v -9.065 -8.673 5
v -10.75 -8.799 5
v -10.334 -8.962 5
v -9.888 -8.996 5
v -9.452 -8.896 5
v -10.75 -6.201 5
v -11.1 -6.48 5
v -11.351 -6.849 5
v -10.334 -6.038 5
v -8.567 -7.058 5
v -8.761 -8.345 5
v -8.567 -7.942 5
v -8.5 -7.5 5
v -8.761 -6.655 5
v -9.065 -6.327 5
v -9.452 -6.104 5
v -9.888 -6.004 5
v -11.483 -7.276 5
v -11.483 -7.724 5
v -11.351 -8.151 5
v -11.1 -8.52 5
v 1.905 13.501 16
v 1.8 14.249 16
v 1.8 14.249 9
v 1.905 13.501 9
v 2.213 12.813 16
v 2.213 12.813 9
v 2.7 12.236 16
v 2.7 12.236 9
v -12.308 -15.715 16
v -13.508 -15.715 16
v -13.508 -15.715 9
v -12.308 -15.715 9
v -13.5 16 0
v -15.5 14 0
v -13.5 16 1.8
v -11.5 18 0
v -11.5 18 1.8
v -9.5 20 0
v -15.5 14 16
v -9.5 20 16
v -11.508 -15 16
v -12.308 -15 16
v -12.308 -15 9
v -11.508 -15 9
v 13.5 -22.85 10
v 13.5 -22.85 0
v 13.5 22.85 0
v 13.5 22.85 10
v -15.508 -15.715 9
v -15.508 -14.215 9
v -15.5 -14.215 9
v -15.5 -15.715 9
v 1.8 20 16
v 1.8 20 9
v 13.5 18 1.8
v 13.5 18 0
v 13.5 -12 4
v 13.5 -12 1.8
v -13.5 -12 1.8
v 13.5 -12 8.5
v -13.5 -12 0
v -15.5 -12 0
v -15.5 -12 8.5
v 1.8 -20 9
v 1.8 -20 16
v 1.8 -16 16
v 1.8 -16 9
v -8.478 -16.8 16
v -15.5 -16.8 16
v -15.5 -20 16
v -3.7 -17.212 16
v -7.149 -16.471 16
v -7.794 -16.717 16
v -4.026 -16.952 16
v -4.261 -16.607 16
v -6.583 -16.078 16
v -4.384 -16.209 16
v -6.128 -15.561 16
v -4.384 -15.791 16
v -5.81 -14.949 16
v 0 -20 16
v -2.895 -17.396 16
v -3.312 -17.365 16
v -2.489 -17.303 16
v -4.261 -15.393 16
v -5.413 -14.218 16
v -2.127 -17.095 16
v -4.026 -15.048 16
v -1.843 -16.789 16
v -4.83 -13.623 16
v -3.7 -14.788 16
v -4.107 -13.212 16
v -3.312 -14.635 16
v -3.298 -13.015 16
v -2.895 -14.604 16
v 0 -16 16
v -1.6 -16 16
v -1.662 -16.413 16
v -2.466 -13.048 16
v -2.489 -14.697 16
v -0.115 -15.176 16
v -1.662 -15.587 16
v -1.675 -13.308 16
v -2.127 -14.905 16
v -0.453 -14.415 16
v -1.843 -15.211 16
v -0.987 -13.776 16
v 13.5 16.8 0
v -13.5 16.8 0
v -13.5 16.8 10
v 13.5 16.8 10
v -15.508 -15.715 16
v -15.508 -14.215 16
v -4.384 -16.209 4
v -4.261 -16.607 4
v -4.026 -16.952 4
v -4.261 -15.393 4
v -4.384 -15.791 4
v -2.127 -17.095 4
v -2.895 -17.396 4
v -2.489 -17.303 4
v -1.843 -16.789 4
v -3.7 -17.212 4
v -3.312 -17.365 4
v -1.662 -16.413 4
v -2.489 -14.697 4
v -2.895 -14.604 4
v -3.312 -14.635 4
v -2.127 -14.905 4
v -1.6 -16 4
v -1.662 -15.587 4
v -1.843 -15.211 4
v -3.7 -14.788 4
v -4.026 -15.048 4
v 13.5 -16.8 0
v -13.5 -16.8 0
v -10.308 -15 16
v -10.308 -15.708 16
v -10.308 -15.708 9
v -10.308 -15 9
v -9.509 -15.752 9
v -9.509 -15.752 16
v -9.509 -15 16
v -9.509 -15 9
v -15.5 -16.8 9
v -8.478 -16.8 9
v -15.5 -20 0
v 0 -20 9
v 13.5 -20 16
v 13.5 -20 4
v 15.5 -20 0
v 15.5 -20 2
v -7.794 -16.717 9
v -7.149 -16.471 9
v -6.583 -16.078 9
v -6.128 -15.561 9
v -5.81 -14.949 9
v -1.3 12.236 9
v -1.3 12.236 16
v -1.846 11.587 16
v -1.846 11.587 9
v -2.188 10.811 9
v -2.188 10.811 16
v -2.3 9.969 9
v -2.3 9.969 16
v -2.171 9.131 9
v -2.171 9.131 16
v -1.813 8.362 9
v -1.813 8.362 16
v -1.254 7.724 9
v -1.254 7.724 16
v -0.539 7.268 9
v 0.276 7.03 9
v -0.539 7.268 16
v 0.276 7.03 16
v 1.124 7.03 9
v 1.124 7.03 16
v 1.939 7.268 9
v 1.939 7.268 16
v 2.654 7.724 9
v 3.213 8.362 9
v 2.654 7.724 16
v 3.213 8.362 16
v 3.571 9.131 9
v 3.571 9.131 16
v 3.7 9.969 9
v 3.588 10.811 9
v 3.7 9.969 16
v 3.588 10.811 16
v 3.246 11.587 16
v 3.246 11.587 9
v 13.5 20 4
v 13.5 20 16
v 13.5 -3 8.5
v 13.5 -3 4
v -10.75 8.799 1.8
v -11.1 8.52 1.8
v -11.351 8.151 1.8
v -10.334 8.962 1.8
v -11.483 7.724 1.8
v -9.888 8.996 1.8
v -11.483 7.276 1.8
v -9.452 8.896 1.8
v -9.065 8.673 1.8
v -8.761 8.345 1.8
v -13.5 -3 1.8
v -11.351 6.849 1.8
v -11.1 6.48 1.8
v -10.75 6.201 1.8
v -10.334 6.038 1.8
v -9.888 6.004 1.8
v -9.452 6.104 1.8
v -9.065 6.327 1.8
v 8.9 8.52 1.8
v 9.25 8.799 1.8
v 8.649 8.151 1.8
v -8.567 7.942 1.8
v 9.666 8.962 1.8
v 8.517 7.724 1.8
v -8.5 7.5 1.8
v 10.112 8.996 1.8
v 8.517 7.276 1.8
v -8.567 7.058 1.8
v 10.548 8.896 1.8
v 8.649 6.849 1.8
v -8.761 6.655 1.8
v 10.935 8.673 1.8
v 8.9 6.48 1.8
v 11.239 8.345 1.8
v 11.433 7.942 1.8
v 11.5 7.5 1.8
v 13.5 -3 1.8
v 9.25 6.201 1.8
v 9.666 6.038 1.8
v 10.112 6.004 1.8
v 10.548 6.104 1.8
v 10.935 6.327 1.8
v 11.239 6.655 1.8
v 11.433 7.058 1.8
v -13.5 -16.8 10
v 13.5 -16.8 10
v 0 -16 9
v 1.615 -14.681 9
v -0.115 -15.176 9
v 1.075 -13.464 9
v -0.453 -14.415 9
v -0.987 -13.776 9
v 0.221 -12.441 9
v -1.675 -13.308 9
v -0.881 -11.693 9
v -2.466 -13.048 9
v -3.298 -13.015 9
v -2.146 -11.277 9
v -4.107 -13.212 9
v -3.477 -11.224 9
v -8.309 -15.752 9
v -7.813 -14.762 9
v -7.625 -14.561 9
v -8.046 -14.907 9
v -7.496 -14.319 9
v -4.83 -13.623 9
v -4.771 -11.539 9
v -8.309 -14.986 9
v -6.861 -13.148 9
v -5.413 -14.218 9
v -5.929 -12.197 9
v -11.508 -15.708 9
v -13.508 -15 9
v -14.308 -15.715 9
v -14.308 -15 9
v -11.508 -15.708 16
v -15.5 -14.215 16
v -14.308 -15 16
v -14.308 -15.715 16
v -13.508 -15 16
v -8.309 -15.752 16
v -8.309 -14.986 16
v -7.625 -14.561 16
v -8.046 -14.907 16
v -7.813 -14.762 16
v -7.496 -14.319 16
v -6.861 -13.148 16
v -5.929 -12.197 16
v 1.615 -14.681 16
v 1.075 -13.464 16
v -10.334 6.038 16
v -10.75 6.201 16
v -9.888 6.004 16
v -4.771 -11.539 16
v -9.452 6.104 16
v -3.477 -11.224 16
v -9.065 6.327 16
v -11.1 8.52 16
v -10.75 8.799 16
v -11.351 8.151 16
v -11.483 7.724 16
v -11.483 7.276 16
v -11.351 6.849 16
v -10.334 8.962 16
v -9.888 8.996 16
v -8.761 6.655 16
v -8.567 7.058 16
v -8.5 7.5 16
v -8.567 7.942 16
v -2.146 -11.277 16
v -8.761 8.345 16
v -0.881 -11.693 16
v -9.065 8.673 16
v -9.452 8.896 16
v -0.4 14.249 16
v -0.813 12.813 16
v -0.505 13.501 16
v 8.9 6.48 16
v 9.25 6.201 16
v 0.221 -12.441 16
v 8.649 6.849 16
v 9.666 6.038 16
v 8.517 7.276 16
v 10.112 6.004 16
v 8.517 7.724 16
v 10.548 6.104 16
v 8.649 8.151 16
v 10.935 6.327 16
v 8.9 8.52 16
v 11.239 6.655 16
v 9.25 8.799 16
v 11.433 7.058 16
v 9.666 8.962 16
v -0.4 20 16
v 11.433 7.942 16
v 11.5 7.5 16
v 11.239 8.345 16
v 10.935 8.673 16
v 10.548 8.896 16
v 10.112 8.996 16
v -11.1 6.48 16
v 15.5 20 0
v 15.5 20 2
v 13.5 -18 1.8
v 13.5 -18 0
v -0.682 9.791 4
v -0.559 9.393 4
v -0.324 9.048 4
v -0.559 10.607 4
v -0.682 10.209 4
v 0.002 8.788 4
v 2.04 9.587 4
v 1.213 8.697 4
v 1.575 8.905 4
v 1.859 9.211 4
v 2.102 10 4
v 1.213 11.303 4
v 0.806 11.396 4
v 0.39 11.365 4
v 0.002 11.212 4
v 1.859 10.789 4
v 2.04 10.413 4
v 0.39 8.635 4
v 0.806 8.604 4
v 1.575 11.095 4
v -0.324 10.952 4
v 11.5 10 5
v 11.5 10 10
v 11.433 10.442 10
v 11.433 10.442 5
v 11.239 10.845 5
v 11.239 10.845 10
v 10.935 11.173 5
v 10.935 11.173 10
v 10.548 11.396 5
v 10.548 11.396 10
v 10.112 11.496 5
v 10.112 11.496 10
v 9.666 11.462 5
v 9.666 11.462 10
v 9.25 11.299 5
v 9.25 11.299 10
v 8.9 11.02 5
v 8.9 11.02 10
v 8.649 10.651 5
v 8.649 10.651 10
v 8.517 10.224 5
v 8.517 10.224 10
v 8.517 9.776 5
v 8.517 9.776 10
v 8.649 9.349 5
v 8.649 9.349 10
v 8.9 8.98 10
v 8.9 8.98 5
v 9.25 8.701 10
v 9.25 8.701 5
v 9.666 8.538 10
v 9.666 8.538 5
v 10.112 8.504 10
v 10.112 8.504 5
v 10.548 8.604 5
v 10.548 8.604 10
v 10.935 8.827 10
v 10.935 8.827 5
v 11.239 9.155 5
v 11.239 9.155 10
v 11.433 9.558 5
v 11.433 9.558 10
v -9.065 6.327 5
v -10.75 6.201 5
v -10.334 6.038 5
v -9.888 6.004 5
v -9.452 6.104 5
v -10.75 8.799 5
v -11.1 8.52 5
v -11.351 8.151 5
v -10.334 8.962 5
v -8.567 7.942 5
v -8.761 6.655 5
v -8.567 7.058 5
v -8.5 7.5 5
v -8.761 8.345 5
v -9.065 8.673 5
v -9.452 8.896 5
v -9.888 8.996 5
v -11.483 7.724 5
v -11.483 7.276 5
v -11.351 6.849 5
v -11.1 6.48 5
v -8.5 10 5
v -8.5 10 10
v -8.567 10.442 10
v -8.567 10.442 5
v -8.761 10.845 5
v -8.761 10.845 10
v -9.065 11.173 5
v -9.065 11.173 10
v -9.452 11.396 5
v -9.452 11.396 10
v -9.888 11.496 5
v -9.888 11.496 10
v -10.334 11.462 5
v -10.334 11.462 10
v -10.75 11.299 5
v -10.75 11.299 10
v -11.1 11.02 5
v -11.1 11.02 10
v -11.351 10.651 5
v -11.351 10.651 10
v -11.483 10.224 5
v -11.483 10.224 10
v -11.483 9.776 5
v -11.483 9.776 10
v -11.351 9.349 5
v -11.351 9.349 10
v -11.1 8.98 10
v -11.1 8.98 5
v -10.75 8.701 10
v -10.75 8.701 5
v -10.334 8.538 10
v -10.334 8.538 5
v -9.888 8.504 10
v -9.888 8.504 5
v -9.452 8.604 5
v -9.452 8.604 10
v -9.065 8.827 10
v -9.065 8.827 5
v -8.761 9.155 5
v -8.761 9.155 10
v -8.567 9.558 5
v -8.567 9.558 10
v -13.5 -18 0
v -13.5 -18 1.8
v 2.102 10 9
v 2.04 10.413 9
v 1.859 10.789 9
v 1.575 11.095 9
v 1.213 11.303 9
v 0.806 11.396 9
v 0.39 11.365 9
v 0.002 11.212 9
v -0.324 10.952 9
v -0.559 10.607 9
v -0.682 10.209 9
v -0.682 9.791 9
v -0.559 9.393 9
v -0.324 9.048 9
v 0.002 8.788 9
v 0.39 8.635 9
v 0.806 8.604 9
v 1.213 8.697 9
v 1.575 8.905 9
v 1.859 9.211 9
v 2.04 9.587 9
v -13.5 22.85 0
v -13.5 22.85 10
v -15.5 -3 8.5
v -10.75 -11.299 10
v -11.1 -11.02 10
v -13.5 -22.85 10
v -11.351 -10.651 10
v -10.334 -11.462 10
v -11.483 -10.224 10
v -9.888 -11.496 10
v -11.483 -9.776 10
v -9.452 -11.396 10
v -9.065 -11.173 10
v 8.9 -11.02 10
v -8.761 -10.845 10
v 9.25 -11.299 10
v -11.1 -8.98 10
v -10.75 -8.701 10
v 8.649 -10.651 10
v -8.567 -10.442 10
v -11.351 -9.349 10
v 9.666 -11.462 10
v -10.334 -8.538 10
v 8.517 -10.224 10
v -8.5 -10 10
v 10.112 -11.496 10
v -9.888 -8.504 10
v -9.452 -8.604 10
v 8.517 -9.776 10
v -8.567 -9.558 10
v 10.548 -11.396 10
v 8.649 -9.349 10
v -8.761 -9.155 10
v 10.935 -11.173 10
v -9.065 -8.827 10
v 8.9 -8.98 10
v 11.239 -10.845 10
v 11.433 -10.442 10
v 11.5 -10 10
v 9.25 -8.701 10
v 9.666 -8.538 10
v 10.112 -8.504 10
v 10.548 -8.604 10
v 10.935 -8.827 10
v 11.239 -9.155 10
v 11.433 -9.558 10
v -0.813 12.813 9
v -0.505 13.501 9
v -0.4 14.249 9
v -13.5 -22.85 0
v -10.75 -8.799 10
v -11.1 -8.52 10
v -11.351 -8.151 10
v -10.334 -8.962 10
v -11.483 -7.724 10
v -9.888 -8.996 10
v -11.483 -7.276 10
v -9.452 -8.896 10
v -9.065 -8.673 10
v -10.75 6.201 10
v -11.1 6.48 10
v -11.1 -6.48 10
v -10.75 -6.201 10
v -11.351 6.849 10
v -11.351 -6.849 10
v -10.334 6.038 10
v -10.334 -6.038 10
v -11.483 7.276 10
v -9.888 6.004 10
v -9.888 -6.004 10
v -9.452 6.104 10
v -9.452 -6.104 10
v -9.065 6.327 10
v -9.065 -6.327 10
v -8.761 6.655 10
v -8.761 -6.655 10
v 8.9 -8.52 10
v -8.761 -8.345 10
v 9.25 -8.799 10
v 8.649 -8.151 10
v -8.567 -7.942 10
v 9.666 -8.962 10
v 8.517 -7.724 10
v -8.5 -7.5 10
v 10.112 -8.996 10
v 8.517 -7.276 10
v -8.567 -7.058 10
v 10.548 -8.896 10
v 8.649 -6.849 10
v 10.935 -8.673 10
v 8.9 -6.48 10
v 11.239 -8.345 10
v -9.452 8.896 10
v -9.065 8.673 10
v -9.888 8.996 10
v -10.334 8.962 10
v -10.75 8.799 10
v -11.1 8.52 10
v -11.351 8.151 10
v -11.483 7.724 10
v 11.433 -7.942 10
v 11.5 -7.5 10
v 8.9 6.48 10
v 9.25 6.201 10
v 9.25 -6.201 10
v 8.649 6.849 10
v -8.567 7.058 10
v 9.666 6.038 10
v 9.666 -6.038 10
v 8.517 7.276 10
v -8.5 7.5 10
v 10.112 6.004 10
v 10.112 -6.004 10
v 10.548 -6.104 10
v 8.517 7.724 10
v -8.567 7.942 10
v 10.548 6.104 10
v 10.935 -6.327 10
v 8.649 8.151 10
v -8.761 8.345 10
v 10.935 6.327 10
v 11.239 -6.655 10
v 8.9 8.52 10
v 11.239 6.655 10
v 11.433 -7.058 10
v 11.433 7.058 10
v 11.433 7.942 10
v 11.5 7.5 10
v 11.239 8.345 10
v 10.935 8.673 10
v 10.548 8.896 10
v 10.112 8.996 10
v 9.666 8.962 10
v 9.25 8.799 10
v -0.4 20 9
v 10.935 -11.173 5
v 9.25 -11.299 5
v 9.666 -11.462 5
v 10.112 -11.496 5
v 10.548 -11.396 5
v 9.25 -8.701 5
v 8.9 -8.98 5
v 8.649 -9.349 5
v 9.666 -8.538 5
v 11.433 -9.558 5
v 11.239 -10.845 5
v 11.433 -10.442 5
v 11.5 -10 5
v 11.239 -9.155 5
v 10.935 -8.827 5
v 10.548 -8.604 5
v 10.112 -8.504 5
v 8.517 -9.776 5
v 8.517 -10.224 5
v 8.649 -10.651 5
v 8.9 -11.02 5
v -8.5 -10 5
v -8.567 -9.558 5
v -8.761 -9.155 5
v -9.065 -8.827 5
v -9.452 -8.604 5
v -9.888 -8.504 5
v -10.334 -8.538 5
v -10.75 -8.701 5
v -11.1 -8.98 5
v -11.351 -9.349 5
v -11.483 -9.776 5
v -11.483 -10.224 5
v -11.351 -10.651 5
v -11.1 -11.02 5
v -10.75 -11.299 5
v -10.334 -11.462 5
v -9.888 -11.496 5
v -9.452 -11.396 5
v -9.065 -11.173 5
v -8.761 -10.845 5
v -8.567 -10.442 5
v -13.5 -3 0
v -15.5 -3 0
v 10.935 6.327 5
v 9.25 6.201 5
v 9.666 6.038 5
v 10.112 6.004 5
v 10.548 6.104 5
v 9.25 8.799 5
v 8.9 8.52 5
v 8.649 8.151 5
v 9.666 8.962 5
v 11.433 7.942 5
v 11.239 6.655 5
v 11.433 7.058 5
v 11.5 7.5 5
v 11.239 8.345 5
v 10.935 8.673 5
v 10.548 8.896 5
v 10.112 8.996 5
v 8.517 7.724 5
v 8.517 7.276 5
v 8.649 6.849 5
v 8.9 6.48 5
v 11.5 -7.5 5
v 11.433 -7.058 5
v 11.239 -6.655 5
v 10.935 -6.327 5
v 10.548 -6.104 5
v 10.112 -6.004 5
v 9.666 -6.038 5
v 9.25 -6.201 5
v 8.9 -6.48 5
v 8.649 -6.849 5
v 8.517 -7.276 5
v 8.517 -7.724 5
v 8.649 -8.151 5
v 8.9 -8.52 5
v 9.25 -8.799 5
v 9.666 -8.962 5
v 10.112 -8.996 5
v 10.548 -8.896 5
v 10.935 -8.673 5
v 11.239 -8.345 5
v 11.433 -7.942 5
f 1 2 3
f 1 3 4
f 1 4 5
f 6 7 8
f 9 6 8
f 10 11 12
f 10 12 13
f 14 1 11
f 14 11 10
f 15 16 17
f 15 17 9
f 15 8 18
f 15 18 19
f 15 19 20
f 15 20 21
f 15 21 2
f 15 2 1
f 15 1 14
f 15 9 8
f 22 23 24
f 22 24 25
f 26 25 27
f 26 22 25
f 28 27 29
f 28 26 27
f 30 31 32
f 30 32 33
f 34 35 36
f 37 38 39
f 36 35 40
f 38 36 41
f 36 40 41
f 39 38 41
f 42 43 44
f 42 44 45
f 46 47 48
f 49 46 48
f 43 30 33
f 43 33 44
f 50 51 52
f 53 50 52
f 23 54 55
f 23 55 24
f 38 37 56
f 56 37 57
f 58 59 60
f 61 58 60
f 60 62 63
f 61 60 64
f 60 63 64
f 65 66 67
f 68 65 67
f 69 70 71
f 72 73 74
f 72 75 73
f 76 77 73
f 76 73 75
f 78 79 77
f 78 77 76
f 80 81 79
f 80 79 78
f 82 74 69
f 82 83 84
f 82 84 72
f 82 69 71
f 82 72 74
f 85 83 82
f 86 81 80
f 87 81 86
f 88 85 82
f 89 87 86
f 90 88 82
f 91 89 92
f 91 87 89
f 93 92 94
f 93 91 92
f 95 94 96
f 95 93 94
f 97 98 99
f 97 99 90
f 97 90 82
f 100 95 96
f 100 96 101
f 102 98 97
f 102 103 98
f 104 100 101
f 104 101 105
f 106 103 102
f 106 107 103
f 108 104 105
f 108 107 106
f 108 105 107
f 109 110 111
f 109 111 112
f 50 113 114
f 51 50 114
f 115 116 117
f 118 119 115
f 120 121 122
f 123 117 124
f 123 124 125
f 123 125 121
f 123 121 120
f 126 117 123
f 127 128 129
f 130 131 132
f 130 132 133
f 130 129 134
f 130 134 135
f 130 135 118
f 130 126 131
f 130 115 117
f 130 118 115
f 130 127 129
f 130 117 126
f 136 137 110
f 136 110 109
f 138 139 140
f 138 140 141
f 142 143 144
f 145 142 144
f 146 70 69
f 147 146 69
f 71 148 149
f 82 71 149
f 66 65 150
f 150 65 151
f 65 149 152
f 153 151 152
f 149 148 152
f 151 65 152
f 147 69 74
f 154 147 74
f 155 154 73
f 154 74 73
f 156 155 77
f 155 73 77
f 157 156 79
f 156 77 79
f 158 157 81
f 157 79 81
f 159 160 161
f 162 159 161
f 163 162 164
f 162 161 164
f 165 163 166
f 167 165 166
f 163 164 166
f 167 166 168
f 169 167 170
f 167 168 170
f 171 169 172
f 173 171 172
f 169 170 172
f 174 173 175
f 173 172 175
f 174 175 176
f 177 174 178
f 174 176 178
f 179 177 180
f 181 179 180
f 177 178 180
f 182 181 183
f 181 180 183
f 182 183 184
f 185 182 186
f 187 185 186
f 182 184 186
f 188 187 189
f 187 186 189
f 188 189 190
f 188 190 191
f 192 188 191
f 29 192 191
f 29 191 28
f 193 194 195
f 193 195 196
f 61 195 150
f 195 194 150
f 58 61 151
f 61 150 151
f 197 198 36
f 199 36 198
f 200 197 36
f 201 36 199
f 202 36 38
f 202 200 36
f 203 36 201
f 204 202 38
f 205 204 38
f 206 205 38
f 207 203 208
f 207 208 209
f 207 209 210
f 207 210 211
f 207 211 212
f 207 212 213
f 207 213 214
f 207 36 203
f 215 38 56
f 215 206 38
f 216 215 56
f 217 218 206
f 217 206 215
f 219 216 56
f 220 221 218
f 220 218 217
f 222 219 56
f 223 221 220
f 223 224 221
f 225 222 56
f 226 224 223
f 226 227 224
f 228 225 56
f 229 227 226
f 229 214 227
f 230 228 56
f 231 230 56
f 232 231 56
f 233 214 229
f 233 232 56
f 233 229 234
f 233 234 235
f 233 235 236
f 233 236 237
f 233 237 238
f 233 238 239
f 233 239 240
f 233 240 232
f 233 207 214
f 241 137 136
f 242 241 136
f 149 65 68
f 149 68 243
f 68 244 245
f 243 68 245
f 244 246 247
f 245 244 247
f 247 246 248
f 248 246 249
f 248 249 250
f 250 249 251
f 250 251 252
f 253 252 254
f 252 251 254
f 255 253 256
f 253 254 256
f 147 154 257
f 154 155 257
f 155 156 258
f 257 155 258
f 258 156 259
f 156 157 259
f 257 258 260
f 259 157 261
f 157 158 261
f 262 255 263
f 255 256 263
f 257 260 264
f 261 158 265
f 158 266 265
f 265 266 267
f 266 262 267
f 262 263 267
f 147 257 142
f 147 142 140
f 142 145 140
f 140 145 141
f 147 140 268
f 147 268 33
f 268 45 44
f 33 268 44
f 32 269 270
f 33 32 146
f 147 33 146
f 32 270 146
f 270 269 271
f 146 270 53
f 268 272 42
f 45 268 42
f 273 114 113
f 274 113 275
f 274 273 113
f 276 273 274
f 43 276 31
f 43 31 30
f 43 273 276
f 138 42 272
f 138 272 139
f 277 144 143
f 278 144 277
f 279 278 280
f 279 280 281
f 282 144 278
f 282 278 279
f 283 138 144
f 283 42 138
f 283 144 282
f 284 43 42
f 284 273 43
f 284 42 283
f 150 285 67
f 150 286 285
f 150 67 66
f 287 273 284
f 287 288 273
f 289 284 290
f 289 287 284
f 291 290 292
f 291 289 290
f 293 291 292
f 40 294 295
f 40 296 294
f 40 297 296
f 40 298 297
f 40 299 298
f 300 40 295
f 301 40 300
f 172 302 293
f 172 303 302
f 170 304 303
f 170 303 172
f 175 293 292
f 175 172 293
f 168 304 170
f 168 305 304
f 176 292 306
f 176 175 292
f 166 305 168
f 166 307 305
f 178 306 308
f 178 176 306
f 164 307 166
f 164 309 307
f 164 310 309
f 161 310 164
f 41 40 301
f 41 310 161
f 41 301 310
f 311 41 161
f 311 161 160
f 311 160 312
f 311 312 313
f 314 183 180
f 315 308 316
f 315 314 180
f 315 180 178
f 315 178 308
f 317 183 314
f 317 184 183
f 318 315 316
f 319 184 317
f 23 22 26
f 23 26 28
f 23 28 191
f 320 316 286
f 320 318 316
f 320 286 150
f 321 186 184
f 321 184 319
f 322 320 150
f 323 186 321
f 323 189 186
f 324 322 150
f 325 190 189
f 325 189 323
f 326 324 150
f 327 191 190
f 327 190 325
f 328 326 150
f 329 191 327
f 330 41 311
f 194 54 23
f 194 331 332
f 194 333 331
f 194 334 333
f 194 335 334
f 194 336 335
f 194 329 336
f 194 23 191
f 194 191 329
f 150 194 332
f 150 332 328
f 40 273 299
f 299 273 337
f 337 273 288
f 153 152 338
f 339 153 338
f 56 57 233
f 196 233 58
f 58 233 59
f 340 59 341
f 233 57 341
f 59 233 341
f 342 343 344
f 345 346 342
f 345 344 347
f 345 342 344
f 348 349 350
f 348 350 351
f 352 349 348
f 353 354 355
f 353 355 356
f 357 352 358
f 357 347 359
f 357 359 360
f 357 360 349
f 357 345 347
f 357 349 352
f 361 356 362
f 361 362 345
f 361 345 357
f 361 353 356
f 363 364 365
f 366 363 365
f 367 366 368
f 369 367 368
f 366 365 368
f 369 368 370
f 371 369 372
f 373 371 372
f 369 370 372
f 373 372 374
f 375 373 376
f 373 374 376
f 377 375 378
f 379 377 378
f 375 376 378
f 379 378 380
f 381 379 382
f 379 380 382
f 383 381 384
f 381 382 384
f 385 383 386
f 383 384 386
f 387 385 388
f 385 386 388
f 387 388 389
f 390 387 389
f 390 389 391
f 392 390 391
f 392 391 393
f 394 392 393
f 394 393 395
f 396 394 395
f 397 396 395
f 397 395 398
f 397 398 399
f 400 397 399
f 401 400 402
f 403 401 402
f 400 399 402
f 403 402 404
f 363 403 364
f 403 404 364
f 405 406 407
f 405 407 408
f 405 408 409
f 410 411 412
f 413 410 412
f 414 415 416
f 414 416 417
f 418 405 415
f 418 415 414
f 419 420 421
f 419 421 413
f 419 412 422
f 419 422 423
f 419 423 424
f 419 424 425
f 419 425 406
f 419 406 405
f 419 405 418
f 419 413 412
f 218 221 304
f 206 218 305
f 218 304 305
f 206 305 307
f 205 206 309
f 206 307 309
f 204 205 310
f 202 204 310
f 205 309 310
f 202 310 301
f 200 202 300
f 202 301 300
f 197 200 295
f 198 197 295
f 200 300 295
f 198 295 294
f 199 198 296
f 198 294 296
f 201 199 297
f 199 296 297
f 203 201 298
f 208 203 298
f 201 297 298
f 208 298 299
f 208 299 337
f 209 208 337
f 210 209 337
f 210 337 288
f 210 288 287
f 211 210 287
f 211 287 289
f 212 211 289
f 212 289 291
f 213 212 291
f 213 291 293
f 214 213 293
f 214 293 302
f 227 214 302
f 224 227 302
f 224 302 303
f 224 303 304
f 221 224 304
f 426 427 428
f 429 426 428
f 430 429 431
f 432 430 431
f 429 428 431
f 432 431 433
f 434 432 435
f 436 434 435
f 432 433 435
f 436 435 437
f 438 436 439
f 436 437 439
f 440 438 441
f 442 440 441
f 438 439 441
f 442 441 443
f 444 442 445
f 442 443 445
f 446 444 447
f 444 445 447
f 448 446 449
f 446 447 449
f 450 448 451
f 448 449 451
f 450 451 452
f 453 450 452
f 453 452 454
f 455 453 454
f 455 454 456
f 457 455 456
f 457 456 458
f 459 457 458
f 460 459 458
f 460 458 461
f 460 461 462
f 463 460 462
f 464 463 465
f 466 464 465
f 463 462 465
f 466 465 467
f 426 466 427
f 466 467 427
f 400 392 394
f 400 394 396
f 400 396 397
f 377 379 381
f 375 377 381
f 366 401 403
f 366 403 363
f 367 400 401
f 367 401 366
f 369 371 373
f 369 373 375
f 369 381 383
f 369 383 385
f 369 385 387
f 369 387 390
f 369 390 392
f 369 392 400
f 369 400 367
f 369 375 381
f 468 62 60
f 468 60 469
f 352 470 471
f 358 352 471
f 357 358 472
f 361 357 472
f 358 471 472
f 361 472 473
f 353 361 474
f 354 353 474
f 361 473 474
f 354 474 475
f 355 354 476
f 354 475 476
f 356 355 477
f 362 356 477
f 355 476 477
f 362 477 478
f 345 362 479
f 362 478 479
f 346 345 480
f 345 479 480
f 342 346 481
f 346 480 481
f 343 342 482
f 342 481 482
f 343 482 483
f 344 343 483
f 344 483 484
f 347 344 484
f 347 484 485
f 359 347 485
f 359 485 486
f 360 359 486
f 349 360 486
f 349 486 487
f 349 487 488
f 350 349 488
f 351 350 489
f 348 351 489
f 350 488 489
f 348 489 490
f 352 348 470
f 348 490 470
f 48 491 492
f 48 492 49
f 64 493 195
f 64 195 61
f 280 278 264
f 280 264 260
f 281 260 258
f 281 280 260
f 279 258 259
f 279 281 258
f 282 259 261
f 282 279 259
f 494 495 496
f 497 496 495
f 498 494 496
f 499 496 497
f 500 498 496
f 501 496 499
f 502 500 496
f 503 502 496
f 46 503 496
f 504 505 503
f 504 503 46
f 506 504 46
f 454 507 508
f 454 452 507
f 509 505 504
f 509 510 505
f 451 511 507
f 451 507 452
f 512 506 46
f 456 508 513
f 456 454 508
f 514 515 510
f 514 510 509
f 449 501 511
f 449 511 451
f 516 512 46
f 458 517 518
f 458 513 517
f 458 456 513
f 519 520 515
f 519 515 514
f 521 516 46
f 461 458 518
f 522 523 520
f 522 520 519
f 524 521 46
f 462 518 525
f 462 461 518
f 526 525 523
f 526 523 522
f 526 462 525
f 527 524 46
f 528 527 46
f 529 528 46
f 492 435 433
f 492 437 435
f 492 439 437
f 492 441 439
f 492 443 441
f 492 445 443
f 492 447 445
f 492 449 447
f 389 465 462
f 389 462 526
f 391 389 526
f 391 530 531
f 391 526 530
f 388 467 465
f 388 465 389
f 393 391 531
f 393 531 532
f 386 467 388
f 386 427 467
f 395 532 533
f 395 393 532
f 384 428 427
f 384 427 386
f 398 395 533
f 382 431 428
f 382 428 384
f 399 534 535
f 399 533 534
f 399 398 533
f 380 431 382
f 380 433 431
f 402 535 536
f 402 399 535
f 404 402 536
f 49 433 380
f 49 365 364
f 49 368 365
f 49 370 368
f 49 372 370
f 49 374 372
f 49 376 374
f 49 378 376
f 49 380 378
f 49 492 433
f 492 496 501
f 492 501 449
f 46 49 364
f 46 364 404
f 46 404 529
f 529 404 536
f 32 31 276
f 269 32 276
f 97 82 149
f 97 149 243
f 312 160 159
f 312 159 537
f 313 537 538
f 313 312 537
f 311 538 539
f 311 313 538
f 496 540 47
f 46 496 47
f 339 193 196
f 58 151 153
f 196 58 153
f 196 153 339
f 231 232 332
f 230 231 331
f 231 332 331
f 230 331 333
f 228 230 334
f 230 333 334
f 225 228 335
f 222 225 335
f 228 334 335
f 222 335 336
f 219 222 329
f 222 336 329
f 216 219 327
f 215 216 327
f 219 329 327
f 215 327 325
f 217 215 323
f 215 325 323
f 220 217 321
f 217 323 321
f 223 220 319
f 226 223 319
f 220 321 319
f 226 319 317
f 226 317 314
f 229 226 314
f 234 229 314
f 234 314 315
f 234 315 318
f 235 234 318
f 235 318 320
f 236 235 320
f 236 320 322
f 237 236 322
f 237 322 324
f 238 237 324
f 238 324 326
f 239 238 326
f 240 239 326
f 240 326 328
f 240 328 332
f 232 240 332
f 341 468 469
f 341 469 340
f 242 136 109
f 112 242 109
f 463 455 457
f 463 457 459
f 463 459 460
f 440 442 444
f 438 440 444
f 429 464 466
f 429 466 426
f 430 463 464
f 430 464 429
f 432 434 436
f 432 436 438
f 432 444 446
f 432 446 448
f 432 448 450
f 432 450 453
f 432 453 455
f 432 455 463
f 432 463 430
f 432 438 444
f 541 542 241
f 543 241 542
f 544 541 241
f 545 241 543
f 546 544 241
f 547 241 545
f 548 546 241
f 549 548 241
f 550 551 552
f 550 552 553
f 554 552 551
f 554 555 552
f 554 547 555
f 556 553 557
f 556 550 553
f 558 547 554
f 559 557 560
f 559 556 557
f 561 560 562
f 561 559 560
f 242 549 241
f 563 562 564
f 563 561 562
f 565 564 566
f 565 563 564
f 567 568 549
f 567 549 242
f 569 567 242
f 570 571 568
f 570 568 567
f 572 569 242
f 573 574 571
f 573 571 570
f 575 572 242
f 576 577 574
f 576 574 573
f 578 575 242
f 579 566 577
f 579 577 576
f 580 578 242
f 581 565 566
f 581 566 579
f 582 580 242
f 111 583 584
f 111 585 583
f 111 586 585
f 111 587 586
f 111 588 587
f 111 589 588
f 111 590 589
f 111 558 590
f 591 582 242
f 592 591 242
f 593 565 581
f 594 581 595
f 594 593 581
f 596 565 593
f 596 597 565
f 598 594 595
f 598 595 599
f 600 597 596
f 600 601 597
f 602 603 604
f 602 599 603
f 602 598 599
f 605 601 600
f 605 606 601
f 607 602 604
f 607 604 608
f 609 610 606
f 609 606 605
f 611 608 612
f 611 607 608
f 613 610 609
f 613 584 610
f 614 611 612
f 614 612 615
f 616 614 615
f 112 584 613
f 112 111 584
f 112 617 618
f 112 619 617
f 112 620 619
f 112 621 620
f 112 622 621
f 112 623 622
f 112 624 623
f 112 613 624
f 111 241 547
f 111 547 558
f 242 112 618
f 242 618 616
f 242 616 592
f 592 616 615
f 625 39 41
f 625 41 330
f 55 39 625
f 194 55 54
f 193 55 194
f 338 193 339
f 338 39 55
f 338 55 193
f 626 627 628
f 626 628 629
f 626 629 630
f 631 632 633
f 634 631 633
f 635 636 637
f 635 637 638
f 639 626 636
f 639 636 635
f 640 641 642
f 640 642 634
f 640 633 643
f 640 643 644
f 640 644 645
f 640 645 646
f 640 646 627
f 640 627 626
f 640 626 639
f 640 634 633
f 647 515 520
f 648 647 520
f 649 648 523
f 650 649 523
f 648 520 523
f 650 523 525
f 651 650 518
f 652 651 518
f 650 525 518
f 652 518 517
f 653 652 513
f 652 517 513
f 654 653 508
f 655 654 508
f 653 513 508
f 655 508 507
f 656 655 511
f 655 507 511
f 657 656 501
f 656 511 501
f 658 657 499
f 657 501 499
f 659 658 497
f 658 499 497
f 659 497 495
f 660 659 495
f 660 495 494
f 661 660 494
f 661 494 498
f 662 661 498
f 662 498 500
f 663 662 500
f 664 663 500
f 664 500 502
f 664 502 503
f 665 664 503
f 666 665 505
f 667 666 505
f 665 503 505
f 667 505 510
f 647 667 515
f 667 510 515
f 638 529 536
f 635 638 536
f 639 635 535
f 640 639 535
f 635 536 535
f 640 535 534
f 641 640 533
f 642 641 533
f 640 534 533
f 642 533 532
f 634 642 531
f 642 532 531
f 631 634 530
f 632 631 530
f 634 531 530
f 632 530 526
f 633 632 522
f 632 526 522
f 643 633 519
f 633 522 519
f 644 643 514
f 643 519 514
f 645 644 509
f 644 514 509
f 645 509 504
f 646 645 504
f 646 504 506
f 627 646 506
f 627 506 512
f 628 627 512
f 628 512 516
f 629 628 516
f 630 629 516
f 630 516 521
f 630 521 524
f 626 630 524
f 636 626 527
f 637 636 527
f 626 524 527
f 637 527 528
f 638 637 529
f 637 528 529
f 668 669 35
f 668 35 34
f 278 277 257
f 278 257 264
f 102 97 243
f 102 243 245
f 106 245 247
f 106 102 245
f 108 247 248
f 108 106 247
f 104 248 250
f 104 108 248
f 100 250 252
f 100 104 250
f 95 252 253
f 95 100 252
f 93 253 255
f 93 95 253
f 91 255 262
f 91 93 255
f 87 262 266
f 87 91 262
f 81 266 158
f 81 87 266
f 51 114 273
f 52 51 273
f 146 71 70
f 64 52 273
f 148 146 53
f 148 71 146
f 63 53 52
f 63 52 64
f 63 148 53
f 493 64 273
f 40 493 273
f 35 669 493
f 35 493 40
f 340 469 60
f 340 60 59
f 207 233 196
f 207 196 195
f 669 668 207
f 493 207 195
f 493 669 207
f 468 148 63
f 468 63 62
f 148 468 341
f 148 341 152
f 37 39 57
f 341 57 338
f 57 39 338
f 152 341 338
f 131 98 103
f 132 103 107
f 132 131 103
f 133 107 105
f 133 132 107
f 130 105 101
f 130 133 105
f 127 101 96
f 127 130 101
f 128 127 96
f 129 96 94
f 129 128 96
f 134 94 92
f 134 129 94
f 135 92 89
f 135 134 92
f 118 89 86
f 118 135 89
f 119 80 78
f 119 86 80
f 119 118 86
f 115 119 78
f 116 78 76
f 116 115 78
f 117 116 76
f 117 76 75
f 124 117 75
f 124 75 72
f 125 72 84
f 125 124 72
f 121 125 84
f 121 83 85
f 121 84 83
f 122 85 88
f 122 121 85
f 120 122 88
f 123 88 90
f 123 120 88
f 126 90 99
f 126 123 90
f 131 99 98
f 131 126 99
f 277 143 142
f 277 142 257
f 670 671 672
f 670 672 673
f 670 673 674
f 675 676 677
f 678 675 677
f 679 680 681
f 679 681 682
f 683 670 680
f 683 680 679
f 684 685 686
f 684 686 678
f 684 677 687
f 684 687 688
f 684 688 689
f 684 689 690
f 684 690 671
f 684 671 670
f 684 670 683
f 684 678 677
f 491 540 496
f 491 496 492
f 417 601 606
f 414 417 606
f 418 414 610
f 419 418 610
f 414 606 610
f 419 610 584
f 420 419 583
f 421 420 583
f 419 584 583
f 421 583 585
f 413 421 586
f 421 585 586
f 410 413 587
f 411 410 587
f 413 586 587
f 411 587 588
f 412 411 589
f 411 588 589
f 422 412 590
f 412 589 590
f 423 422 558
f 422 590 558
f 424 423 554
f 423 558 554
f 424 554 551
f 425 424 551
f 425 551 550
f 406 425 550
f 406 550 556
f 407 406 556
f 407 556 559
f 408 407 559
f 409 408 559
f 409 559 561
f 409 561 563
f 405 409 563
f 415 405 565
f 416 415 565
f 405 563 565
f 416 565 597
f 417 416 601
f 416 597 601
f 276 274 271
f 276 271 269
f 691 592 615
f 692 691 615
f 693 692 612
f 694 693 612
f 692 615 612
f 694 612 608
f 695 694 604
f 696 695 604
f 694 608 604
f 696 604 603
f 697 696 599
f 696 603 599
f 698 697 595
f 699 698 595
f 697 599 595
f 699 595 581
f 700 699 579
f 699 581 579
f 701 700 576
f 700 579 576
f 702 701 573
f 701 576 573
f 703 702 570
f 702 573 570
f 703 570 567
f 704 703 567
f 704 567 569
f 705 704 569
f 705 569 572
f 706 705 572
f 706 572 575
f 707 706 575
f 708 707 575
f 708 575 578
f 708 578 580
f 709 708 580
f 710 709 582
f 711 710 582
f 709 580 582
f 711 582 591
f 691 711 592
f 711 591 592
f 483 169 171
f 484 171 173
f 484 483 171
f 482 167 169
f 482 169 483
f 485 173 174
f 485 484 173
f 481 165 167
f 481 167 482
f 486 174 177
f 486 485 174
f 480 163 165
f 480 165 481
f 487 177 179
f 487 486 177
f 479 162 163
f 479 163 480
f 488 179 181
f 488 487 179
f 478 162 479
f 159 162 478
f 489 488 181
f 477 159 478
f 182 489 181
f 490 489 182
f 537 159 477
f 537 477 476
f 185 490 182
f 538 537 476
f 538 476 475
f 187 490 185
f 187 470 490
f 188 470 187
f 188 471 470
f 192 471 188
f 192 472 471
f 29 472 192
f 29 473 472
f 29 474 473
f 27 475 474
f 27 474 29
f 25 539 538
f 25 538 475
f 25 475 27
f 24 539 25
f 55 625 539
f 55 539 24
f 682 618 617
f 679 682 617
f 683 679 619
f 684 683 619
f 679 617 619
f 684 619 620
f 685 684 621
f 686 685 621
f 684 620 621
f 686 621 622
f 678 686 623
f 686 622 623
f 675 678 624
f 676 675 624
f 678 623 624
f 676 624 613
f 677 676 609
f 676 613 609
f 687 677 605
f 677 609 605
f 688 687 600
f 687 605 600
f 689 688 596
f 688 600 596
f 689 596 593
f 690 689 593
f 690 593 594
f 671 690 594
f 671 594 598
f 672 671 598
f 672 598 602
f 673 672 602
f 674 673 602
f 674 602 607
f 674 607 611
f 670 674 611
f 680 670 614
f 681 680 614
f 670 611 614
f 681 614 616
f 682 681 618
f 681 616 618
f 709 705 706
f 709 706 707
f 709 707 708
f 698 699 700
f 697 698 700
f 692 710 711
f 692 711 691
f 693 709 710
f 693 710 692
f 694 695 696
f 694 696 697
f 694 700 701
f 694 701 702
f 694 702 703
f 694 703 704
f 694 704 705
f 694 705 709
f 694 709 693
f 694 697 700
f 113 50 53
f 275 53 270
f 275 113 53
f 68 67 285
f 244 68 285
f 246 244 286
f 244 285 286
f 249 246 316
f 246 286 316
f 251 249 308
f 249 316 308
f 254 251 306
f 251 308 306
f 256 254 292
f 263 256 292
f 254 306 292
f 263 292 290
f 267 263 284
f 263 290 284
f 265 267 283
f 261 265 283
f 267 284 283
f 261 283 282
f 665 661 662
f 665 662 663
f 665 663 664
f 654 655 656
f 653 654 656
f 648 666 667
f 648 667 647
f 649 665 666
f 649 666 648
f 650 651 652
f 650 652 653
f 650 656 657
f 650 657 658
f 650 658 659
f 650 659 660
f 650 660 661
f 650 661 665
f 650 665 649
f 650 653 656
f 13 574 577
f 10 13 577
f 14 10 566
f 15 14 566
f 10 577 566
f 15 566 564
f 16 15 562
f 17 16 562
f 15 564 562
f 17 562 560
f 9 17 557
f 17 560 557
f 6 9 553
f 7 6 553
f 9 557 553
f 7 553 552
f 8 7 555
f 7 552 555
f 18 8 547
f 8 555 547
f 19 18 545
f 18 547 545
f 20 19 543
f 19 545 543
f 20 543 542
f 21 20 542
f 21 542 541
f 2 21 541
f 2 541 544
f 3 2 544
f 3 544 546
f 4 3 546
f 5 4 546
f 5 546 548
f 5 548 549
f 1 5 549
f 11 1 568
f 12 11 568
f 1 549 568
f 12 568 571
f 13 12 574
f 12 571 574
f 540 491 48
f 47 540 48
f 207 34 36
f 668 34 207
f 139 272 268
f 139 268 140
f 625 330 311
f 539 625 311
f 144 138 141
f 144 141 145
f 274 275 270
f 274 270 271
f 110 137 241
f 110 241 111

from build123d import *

# Parameters (mm, degrees)
SKETCH_W             = 27
SKETCH_H             = 45.7
PAD_DEPTH            = 10
SKETCH002_R          = 1.5
POCKET_DEPTH         = 5
SKETCH004_W          = 27
SKETCH004_H          = 33.6
PAD001_DEPTH         = 10
SKETCH003_R          = 1.5
POCKET001_DEPTH      = 5
SKETCH005_W          = 31
SKETCH005_H          = 40
PAD002_DEPTH         = 16
SKETCH006_W          = 27
SKETCH006_H          = 36
POCKET002_DEPTH      = 1.8
SKETCH007_W          = 9
SKETCH007_H          = 11.052409
POCKET003_DEPTH      = 29
POCKET004_DEPTH      = 40.001
SKETCH011_R          = 1.5
POCKET005_DEPTH      = 16.001
POCKET006_DEPTH      = 7
SKETCH015_R          = 1.4
POCKET007_DEPTH      = 5
POCKET007_DEPTH_BACK = -100
POCKET008_DEPTH      = 16.001
SKETCH016_W          = 1.2
SKETCH016_H          = 1.5
PAD003_DEPTH         = 7


with BuildPart() as carriageh:
    # Sketch → Pad (new body)
    with BuildSketch(Plane.XY):
        Rectangle(SKETCH_W, SKETCH_H)
    extrude(amount=PAD_DEPTH)

    # Sketch002 (on Face6 of Pad) → Pocket (cut)
    with BuildSketch(Plane.XY.offset(10)):
        with Locations((-10, 10)):
            Circle(SKETCH002_R)
        with Locations((10, 10)):
            Circle(SKETCH002_R)
        with Locations((-10, -10)):
            Circle(SKETCH002_R)
        with Locations((10, -10)):
            Circle(SKETCH002_R)
    extrude(amount=-POCKET_DEPTH, mode=Mode.SUBTRACT)


with BuildPart() as carriagec:
    # Sketch004 → Pad001 (new body)
    with BuildSketch(Plane.XY):
        Rectangle(SKETCH004_W, SKETCH004_H)
    extrude(amount=PAD001_DEPTH)

    # Sketch003 (on Face6 of Pad001) → Pocket001 (cut)
    with BuildSketch(Plane.XY.offset(10)):
        with Locations((-10, 7.5)):
            Circle(SKETCH003_R)
        with Locations((10, 7.5)):
            Circle(SKETCH003_R)
        with Locations((-10, -7.5)):
            Circle(SKETCH003_R)
        with Locations((10, -7.5)):
            Circle(SKETCH003_R)
    extrude(amount=-POCKET001_DEPTH, mode=Mode.SUBTRACT)


with BuildPart() as crail:
    # Sketch005 → Pad002 (new body)
    with BuildSketch(Plane.XY):
        Rectangle(SKETCH005_W, SKETCH005_H)
    extrude(amount=PAD002_DEPTH)

    # Sketch006 (on Face5 of Pad002) → Pocket002 (cut)
    with BuildSketch(Plane(origin=(0, 0, 0), x_dir=(1, 0, 0), z_dir=(0, 0, -1))):
        Rectangle(SKETCH006_W, SKETCH006_H)
    extrude(amount=-POCKET002_DEPTH, mode=Mode.SUBTRACT)

    # Sketch007 (on Face2 of Pocket002) → Pocket003 (cut)
    with BuildSketch(Plane(origin=(-15.5, 0, 0), x_dir=(0, -1, 0), z_dir=(-1, 0, 0))):
        with Locations((7.5, 2.973796)):
            Rectangle(SKETCH007_W, SKETCH007_H)
    extrude(amount=-POCKET003_DEPTH, mode=Mode.SUBTRACT)

    # Sketch009 (on Face9 of Pocket003) → Pocket004 (cut, through all)
    with BuildSketch(Plane.XZ.offset(20)):
        Polygon((13.5, 18.73), (13.5, 4), (19.97, -2.47), (19.97, 18.73), align=None)
    extrude(amount=-POCKET004_DEPTH, mode=Mode.SUBTRACT)

    # Sketch011 (on Face6 of Pocket004) → Pocket005 (cut, through all)
    with BuildSketch(Plane.XY.offset(16)):
        with Locations((-10, 7.5)):
            Circle(SKETCH011_R)
        with Locations((10, 7.5)):
            Circle(SKETCH011_R)
    extrude(amount=-POCKET005_DEPTH, mode=Mode.SUBTRACT)

    # Sketch012 → Pocket006 (cut)
    with BuildSketch(Plane.XY.offset(16)):
        with BuildLine():
            Line((1.8, 29.248529), (-0.4, 29.248529))
            Line((-0.4, 29.248529), (-0.4, 14.248529))
            ThreePointArc((-1.3, 12.236068), (-0.635248, 13.146259), (-0.4, 14.248529))
            ThreePointArc((-1.3, 12.236068), (0.7, 7), (2.7, 12.236068))
            ThreePointArc((1.8, 14.248529), (2.035248, 13.146259), (2.7, 12.236068))
            Line((1.8, 29.248529), (1.8, 14.248529))
        make_face()
        with BuildLine():
            Line((0, -22.14), (0, -16))
            ThreePointArc((0, -16), (-2.466134, -13.047884), (-5.809991, -14.94931))
            ThreePointArc((-8.477818, -16.8), (-6.854369, -16.29203), (-5.809991, -14.94931))
            Line((-17.907818, -16.8), (-8.477818, -16.8))
            Line((-17.907818, -16.8), (-17.907818, -15))
            Line((-17.907818, -15), (-8.477818, -15))
            ThreePointArc((-8.477818, -15), (-7.880345, -14.813054), (-7.495986, -14.318896))
            ThreePointArc((1.8, -16), (-2.145814, -11.276615), (-7.495986, -14.318896))
            Line((1.8, -22.14), (1.8, -16))
            Line((0, -22.14), (1.8, -22.14))
        make_face()
    extrude(amount=-POCKET006_DEPTH, mode=Mode.SUBTRACT)

    # Sketch015 → Pocket007 (cut, two sides)
    with BuildSketch(Plane.XY.offset(9)) as pocket007_sk:
        with Locations((-3, -16)):
            Circle(SKETCH015_R)
        with Locations((0.701875, 10)):
            Circle(SKETCH015_R)
    extrude(amount=-POCKET007_DEPTH, mode=Mode.SUBTRACT)
    extrude(pocket007_sk.sketch, amount=-POCKET007_DEPTH_BACK, mode=Mode.SUBTRACT)

    # Sketch014 → Pocket008 (cut, through all)
    with BuildSketch(Plane.XY.offset(16)):
        Polygon((-15.5, 14), (-7.501605, 21.998395), (-21.34561, 27.350628), align=None)
    extrude(amount=-POCKET008_DEPTH, mode=Mode.SUBTRACT)

    # Sketch016 (on Face6 of Pocket007) → Pad003 (join)
    with BuildSketch(Plane.XY.offset(16)):
        with Locations((-14.908157, -14.965309)):
            Rectangle(SKETCH016_W, SKETCH016_H)
        with Locations((-12.908157, -14.965309)):
            Rectangle(SKETCH016_W, SKETCH016_H)
        with Locations((-10.908171, -14.957625)):
            Rectangle(SKETCH016_W, SKETCH016_H)
        with Locations((-8.90867, -15.002286)):
            Rectangle(SKETCH016_W, SKETCH016_H)
    extrude(amount=-PAD003_DEPTH)


solid = Compound([carriageh.part, carriagec.part, crail.part])
